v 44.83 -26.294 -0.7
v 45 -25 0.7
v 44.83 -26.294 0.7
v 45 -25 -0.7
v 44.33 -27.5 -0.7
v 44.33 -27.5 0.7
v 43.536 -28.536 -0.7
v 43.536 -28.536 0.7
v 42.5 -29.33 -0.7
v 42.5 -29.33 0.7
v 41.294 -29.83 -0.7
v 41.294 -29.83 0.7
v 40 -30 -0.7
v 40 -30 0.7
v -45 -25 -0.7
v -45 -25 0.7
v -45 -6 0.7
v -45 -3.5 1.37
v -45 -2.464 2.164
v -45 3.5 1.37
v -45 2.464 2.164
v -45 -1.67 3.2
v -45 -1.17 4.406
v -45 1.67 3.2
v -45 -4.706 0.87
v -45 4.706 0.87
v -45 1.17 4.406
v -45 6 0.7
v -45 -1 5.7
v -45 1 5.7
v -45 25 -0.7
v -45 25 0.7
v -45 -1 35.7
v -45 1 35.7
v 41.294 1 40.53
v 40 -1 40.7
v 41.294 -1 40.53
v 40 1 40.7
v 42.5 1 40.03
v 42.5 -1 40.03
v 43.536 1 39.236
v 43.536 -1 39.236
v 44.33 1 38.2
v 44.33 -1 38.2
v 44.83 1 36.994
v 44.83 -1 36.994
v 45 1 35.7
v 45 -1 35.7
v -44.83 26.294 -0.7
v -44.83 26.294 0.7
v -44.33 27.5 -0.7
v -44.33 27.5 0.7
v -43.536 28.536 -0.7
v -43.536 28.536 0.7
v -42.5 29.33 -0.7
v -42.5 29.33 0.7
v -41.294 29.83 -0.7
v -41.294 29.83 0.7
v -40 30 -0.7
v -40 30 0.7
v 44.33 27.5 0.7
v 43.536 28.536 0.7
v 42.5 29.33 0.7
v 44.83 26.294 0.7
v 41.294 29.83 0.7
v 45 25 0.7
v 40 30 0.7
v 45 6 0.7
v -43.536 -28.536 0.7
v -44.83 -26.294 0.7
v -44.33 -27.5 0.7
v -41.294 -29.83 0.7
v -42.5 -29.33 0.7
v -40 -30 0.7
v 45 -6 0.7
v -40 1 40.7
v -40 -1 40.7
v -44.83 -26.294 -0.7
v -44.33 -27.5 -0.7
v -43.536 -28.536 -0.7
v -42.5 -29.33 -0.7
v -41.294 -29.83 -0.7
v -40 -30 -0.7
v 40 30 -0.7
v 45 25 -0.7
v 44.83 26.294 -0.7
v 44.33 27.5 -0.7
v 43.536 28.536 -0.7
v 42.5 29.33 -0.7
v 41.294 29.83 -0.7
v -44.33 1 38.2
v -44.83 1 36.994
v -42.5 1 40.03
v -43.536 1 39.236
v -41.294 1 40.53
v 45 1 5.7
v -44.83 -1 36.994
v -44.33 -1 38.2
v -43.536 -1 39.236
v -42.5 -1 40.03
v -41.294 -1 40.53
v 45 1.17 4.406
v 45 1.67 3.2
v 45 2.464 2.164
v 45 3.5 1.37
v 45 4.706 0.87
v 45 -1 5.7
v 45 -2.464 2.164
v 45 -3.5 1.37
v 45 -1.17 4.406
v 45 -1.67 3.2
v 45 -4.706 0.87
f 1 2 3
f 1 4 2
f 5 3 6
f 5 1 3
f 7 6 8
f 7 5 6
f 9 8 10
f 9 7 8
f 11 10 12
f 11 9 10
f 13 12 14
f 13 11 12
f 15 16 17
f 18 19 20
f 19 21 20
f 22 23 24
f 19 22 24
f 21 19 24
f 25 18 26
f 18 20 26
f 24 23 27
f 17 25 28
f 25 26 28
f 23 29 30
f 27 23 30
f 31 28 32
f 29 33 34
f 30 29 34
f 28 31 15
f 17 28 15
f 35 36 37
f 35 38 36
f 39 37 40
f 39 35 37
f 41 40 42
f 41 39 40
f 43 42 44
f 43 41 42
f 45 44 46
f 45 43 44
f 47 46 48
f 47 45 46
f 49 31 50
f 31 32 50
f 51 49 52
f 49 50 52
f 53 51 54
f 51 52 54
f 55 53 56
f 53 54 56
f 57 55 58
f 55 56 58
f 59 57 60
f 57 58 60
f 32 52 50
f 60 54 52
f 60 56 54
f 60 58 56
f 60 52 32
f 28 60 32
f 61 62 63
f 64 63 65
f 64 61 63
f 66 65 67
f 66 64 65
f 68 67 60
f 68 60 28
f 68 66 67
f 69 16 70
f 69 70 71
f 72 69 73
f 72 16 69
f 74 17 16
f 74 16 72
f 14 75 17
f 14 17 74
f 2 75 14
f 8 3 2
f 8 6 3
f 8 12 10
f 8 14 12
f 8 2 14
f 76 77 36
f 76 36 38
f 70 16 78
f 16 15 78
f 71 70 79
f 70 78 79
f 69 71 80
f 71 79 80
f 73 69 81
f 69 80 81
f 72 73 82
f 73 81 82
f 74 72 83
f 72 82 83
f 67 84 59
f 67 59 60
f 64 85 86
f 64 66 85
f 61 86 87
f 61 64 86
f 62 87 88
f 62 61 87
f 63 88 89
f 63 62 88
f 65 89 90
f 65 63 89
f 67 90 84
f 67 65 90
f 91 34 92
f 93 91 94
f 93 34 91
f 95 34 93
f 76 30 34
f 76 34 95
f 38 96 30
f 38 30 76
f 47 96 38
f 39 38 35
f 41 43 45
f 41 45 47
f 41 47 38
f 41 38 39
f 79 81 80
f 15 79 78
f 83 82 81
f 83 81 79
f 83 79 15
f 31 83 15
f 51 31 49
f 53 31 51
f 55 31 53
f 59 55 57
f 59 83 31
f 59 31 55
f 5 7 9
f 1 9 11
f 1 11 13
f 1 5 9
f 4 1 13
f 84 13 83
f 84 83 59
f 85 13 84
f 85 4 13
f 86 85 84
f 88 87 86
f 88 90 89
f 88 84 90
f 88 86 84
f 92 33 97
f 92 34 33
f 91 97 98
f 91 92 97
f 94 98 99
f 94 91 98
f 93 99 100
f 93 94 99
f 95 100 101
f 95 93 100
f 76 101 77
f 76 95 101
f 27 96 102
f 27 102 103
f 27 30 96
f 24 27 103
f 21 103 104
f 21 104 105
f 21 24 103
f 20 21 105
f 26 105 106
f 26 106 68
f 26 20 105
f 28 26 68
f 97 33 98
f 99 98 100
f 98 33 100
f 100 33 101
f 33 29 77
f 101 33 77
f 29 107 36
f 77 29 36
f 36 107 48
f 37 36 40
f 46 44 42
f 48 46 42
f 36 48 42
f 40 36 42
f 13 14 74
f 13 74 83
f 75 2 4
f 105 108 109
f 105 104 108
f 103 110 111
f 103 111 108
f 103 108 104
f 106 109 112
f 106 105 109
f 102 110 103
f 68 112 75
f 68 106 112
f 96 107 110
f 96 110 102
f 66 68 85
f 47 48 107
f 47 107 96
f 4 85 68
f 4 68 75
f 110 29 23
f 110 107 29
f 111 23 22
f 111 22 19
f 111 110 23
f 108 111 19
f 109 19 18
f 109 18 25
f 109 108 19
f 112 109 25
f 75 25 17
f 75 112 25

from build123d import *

# Parameters (mm, degrees)
F0_W     = 2
F0_H     = 40
F1_DEPTH = 45
F2_R     = 5
F3_R     = 5


with BuildPart() as f1:
    # F0 (on Right) → F1 (new body, symmetric)
    with BuildSketch(Plane.YZ):
        with Locations((0, 20.7)):
            Rectangle(F0_W, F0_H)
        Polygon((30, -0.7), (30, 0.7), (1, 0.7), (-1, 0.7), (-30, 0.7), (-30, -0.7), align=None)
    extrude(amount=F1_DEPTH, both=True)

    # F2
    f2_edges = [f1.edges().sort_by_distance(p)[0] for p in [
        (0, -1, 0.7),
        (0, 1, 0.7),
    ]]
    fillet(f2_edges, radius=F2_R)

    # F3
    f3_edges = [f1.edges().sort_by_distance(p)[0] for p in [
        (-45, -30, 0),
        (-45, 30, 0),
        (45, 30, 0),
        (45, -30, 0),
        (-45, 0, 40.7),
        (45, 0, 40.7),
    ]]
    fillet(f3_edges, radius=F3_R)


solid = f1.part
